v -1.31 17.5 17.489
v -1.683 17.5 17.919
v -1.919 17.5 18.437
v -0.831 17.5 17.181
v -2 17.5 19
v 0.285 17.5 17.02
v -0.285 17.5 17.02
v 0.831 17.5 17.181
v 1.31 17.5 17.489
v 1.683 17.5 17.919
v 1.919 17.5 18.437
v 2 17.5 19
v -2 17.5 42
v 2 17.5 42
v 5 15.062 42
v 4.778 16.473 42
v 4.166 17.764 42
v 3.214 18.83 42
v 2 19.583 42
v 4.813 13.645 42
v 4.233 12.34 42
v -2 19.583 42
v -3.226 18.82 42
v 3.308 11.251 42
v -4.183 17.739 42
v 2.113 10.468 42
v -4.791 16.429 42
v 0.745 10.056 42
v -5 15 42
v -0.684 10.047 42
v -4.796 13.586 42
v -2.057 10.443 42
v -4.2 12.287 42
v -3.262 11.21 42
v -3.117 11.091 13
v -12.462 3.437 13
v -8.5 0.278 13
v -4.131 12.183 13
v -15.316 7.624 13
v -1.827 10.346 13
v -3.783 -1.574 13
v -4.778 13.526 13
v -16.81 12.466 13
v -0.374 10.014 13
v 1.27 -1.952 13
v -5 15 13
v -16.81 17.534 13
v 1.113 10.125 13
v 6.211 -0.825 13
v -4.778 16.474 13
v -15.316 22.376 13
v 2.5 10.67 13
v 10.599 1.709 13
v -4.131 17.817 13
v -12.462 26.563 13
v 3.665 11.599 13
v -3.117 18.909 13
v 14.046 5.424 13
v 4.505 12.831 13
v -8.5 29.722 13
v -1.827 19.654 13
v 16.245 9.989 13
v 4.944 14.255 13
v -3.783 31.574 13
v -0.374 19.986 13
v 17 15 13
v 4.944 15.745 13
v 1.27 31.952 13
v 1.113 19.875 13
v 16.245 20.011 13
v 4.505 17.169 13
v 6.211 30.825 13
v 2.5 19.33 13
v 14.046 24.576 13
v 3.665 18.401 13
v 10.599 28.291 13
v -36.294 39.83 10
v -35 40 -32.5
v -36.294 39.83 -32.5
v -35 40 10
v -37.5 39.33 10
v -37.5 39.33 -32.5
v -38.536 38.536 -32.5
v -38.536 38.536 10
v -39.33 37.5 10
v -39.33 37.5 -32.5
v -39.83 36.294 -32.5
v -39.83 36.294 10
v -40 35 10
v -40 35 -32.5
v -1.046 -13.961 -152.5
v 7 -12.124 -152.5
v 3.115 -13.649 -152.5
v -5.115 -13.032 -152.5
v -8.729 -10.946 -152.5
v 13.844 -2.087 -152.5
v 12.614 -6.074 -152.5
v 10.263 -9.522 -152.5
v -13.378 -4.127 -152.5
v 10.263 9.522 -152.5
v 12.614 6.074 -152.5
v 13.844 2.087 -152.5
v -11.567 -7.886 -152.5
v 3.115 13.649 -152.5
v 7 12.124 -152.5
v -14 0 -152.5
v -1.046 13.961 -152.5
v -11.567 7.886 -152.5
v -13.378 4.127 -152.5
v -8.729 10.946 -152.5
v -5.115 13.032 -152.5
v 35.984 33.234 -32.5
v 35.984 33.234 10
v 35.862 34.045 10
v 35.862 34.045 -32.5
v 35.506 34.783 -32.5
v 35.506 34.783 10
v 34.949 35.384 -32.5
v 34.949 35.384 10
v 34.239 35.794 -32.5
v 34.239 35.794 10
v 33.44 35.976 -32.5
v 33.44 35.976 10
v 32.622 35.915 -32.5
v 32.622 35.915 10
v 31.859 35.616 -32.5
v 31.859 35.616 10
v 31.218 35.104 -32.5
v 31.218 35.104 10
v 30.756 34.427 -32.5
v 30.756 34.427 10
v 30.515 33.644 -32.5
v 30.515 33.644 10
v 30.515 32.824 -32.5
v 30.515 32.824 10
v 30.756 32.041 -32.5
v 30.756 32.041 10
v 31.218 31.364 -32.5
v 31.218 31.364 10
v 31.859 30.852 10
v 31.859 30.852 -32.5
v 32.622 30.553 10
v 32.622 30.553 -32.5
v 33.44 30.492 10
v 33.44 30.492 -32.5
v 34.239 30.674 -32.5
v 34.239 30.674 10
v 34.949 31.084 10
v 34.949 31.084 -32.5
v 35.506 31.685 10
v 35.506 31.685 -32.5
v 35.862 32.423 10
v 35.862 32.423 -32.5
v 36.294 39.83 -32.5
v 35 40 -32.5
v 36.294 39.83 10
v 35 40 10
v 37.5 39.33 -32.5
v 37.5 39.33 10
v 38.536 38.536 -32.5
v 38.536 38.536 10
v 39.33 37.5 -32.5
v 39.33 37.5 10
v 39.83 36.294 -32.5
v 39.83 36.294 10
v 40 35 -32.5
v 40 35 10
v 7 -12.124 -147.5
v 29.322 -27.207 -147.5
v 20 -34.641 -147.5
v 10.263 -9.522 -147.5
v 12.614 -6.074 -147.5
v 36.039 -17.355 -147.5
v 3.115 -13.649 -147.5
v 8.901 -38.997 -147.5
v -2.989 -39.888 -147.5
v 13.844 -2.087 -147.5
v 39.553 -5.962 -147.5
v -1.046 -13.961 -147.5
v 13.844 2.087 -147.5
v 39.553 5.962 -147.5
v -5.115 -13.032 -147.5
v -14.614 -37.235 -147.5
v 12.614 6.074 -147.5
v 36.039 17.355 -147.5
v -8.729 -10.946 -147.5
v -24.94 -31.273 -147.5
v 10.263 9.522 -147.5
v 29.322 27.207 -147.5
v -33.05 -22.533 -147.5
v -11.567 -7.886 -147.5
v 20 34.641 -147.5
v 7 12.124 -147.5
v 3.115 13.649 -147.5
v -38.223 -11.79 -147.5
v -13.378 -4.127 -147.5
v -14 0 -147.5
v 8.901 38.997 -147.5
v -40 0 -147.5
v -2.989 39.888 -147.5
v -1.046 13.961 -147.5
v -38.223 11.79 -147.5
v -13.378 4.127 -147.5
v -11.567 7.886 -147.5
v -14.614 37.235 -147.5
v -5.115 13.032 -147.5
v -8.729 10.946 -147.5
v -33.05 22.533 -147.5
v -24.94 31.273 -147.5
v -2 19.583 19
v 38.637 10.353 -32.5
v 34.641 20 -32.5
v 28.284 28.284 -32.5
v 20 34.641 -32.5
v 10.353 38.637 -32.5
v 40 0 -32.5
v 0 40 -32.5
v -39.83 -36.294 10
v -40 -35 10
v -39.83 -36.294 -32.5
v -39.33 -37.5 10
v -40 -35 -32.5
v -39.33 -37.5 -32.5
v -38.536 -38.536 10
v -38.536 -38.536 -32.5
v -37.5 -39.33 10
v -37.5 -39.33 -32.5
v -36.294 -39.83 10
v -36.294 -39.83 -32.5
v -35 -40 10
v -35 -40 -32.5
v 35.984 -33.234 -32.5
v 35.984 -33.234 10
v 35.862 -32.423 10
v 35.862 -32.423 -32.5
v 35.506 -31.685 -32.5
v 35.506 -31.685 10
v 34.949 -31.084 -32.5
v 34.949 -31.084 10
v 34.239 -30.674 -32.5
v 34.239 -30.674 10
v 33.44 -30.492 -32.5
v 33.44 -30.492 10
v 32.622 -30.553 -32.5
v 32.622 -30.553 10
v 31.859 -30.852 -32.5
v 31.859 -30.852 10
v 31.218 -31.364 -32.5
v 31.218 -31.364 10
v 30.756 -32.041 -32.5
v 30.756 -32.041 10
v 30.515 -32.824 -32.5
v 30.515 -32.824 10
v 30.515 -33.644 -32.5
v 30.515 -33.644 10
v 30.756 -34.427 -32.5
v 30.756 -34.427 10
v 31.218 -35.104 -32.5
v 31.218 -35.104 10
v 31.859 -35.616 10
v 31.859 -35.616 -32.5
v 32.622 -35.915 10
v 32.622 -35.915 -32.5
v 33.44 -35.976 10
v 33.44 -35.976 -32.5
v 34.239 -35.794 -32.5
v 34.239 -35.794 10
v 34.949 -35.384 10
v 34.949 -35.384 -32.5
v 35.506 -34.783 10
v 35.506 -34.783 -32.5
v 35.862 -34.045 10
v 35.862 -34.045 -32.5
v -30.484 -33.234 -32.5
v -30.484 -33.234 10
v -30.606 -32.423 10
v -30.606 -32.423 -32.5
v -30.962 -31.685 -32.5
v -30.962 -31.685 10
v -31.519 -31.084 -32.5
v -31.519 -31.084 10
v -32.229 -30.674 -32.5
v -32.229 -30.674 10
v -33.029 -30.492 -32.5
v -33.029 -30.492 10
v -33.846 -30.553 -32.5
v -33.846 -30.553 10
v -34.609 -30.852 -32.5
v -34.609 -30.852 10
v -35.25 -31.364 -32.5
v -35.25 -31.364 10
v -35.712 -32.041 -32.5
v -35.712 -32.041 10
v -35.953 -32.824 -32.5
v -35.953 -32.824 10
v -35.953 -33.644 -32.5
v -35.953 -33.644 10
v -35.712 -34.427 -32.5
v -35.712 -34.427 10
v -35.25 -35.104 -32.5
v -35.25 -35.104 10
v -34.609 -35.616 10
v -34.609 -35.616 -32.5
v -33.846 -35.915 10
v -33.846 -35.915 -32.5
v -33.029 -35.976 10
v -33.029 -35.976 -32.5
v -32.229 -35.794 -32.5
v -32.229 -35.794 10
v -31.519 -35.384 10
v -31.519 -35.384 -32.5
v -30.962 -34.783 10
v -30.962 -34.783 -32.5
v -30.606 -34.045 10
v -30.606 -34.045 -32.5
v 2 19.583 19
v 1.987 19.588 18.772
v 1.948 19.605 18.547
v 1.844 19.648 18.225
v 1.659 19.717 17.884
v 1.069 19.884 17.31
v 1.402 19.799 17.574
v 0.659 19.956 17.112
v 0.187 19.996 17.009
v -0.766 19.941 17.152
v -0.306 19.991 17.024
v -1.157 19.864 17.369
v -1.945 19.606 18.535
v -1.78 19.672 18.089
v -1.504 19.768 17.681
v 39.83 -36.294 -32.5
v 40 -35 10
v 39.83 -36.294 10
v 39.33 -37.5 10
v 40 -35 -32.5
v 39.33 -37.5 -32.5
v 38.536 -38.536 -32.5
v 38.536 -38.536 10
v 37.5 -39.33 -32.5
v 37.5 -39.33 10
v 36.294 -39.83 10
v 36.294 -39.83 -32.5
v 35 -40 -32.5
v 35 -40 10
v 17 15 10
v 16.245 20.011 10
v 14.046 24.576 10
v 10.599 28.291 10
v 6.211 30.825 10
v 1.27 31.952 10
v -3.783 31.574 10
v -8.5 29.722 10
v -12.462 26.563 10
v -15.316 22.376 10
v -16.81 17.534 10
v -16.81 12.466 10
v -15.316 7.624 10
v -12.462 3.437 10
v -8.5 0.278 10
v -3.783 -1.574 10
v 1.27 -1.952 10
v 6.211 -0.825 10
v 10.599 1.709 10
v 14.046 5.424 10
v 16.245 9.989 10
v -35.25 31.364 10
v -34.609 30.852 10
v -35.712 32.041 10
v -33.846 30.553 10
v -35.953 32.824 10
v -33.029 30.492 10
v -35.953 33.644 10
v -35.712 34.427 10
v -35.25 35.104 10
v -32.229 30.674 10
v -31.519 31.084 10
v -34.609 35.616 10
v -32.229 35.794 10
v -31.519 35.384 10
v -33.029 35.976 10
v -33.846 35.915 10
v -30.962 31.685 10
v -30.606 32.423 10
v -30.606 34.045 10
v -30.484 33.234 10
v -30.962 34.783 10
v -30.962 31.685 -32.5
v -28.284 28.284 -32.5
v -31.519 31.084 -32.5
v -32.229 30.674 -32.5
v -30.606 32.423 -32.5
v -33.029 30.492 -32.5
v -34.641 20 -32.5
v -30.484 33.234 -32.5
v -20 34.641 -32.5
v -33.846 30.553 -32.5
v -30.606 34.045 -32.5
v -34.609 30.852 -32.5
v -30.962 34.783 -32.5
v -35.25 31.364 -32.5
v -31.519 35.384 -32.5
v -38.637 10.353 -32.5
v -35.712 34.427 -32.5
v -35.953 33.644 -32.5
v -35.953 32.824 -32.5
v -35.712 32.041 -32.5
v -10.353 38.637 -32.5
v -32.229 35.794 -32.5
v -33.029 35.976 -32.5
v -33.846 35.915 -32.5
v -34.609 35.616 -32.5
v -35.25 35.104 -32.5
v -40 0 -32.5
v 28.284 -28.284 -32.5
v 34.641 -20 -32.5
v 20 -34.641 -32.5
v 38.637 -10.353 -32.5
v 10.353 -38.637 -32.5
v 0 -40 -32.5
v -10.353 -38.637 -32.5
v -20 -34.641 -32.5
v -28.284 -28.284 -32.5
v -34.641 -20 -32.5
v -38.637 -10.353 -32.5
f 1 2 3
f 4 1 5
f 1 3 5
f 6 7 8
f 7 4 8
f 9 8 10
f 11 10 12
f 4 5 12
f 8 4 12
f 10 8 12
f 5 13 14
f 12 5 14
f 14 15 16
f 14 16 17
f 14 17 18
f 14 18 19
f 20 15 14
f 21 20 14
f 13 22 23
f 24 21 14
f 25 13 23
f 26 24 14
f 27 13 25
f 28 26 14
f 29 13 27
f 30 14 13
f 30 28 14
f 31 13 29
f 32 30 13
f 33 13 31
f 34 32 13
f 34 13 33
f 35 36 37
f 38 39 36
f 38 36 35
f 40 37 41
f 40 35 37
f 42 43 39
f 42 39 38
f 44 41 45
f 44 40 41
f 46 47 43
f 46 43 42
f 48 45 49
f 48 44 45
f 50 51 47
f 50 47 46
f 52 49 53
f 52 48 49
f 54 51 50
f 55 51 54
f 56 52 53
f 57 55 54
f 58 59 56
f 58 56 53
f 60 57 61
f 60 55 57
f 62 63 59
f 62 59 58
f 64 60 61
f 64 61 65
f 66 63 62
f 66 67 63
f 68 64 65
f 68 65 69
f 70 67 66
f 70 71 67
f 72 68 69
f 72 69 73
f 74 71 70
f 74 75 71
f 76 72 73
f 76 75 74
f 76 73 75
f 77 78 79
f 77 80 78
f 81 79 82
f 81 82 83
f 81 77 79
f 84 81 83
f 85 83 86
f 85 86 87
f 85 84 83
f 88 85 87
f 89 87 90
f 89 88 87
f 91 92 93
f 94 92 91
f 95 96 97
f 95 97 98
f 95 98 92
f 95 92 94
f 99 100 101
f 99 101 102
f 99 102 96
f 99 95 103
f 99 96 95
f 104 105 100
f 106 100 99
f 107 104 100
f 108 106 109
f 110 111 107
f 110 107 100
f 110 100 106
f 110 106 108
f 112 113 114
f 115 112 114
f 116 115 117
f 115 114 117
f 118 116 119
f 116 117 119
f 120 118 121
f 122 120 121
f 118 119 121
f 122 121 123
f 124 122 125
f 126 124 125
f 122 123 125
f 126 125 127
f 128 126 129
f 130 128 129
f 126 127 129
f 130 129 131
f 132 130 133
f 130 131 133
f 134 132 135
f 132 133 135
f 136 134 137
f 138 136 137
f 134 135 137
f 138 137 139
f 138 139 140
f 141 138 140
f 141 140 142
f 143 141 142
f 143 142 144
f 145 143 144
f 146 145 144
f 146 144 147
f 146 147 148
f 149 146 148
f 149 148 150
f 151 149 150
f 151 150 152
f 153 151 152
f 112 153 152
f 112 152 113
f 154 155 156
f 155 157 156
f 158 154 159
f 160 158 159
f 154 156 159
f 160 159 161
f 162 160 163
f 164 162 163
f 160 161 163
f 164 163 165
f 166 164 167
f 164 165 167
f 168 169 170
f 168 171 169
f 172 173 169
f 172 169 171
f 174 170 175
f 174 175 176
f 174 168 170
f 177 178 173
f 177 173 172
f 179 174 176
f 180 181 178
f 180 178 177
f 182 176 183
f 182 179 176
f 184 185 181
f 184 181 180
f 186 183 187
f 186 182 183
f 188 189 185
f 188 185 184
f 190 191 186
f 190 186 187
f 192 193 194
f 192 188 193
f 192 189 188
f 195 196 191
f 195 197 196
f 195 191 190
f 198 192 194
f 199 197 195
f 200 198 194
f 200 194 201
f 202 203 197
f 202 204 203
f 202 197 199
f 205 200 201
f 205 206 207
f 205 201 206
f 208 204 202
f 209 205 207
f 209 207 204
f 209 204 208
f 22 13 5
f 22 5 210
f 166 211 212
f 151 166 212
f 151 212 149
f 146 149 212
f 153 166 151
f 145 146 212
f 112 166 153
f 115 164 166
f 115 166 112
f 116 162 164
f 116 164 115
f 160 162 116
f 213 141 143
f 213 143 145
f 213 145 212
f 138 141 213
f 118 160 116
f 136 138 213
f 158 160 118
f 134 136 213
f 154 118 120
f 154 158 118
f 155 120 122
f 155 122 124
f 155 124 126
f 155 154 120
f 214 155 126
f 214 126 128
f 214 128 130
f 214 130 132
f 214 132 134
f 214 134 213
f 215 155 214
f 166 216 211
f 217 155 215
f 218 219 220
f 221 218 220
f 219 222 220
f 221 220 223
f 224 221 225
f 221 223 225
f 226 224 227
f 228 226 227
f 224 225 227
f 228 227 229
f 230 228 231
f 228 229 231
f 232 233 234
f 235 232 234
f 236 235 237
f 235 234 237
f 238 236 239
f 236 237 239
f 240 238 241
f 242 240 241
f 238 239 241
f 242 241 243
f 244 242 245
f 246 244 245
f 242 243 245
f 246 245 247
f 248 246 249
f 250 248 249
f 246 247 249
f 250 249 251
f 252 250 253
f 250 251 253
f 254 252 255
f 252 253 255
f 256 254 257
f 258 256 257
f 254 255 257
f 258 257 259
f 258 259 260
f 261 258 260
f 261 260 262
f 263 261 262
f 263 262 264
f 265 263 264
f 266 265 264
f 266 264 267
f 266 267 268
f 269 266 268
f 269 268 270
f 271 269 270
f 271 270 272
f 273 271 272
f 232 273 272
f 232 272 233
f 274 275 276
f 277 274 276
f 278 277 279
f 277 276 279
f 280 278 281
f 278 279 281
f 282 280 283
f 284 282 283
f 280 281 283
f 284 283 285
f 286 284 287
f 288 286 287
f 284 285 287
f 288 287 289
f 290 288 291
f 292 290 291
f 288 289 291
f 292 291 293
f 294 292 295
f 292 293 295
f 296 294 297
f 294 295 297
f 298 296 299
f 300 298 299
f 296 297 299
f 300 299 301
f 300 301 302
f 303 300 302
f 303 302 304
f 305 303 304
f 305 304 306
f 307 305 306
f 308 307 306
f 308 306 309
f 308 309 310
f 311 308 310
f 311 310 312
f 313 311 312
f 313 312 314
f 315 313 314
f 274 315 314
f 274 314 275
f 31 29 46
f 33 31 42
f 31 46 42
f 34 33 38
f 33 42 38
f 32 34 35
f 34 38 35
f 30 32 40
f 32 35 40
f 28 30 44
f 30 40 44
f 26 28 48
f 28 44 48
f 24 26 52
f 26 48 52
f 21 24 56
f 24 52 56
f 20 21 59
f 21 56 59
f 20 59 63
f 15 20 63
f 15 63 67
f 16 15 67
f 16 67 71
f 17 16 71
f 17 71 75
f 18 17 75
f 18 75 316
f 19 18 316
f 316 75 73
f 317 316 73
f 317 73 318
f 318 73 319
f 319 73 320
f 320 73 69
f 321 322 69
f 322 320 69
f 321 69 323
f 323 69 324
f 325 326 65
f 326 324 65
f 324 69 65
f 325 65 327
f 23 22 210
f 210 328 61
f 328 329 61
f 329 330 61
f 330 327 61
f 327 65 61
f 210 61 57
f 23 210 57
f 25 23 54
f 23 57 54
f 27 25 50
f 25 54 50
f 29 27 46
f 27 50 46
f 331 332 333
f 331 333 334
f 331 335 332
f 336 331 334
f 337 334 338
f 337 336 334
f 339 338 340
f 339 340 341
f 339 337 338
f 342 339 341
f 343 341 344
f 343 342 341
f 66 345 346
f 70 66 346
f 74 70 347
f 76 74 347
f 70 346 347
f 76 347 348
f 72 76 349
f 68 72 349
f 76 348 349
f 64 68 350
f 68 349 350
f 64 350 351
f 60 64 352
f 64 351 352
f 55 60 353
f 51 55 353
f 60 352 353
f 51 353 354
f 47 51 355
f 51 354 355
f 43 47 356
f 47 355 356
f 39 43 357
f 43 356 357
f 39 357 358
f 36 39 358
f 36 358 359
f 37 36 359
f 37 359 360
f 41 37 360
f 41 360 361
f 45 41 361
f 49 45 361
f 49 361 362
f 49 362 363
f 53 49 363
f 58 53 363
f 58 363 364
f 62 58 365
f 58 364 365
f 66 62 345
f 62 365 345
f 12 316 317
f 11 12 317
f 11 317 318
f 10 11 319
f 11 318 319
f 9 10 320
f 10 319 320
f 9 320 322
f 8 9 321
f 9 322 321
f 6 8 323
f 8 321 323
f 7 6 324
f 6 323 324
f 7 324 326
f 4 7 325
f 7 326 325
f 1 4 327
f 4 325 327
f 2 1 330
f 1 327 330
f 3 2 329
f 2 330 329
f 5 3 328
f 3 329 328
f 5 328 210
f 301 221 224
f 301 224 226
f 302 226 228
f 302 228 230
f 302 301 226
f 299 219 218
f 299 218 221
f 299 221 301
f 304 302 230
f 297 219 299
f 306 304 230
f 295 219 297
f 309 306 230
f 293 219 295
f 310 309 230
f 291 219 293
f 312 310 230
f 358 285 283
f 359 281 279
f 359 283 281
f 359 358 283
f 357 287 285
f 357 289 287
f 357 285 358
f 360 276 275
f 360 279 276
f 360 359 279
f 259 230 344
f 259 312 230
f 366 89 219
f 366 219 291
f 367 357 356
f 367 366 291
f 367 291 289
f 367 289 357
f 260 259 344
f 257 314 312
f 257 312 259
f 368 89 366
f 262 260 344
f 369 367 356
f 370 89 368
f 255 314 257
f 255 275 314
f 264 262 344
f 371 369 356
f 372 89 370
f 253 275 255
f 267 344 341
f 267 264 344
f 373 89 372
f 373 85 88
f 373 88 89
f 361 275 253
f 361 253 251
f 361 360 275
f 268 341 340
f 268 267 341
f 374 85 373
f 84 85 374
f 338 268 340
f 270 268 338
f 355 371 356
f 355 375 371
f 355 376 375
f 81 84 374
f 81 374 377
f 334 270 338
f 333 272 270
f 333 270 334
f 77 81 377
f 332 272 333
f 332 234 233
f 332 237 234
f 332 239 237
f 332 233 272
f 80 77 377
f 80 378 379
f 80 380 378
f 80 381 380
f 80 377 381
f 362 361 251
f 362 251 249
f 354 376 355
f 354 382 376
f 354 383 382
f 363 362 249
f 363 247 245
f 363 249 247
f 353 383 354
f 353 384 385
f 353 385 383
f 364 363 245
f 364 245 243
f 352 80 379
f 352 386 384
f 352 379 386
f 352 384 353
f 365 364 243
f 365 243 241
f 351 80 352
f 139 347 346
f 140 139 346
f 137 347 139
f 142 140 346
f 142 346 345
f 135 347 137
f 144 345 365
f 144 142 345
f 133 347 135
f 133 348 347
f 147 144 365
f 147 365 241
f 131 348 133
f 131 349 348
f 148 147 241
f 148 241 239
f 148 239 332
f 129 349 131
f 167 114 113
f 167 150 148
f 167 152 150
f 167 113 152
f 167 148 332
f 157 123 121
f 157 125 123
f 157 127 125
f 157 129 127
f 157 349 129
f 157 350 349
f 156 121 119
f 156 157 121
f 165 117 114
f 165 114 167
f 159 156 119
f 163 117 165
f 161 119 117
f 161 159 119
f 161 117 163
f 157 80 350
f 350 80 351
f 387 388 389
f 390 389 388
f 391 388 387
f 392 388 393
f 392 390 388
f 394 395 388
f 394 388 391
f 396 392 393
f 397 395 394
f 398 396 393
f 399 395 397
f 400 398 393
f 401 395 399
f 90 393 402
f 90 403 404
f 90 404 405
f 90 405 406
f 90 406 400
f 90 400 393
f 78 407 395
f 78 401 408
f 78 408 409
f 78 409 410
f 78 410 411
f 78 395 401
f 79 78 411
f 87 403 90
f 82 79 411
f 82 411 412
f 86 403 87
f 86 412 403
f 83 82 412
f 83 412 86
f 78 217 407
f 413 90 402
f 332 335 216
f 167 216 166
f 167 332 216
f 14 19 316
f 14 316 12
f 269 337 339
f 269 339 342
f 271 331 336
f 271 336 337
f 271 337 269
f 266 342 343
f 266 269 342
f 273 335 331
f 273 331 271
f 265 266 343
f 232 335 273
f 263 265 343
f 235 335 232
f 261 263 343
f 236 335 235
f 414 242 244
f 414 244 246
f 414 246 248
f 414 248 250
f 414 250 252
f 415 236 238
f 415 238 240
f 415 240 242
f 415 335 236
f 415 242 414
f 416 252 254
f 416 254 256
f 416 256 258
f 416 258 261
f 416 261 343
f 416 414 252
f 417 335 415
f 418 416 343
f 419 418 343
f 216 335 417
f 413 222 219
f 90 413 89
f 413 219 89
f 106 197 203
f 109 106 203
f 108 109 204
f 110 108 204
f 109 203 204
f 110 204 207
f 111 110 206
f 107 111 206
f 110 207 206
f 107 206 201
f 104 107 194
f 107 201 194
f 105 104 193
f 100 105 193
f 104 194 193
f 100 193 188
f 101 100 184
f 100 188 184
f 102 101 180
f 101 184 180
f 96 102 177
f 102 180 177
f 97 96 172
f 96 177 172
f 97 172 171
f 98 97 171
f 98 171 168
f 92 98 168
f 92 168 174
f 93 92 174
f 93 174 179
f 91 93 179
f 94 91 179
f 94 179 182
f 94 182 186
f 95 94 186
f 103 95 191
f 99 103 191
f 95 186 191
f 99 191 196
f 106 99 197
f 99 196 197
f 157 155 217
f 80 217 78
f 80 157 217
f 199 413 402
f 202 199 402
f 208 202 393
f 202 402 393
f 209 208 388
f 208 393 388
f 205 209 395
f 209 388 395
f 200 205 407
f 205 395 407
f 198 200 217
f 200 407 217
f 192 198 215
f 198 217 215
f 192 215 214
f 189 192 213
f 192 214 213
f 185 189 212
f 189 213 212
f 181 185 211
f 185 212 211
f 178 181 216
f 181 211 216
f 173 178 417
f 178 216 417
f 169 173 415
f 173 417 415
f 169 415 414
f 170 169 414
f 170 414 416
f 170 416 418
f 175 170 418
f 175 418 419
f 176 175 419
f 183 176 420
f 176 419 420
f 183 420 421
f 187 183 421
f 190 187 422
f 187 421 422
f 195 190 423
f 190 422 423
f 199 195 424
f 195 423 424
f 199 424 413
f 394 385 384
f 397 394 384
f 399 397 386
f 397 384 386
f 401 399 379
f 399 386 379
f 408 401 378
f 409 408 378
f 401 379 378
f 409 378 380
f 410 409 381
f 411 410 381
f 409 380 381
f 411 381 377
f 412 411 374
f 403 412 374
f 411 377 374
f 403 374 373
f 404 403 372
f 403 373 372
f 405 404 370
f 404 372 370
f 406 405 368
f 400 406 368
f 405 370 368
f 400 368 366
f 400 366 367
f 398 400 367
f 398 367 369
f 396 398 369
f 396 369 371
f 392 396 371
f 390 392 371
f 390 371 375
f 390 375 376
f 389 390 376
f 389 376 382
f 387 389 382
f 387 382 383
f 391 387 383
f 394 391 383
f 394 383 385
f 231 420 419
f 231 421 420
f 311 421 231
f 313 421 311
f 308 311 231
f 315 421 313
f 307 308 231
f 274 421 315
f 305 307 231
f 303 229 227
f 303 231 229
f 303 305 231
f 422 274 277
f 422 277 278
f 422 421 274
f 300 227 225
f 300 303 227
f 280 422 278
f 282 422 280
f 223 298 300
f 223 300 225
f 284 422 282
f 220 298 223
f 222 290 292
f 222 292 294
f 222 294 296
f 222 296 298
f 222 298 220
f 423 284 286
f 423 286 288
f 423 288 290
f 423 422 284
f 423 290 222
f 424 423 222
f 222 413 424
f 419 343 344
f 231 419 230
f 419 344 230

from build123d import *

# Parameters (mm, degrees)
SKETCH_1_W          = 80
SKETCH_1_H          = 80
EXTRUDE_1_DEPTH     = 10
SKETCH_2_R          = 17
EXTRUDE_2_DEPTH     = 3
SKETCH_3_R          = 5
EXTRUDE_3_DEPTH     = 29
CUT_EXTRUDE_1_DEPTH = 23
CUT_EXTRUDE_4_DEPTH = 2.5
SKETCH_7_W          = 80
SKETCH_7_H          = 80
EXTRUDE_6_DEPTH     = 32.5
SKETCH_10_R         = 40
EXTRUDE_7_DEPTH     = 115
SKETCH_11_R         = 14
EXTRUDE_8_DEPTH     = 5
SKETCH_12_R         = 2.75
CUT_EXTRUDE_5_DEPTH = 173.064668076
FILLET_1_R          = 5


with BuildPart() as part:
    # 스케치1 → 보스-돌출1 (new body)
    with BuildSketch(Plane.XY):
        Rectangle(SKETCH_1_W, SKETCH_1_H)
    extrude(amount=EXTRUDE_1_DEPTH)

    # 스케치2 → 보스-돌출2 (add)
    with BuildSketch(Plane.XY.offset(10)):
        with Locations((0, 15)):
            Circle(SKETCH_2_R)
    extrude(amount=EXTRUDE_2_DEPTH)

    # 스케치3 → 보스-돌출3 (add)
    with BuildSketch(Plane.XY.offset(13)):
        with Locations(Location((0, 15, 0), (0, 0, 180))):
            Circle(SKETCH_3_R)
    extrude(amount=EXTRUDE_3_DEPTH)

    # 스케치4 → 컷-돌출1 (cut)
    with BuildSketch(Plane.XY.offset(42)):
        Polygon((0, 17.5), (-2, 17.5), (-2, 20.912683476), (2, 20.912683476), (2, 17.5), align=None)
    extrude(amount=-CUT_EXTRUDE_1_DEPTH, mode=Mode.SUBTRACT)

    # 스케치6 → 컷-돌출4 (cut)
    with BuildSketch(Plane(origin=(0, 20, 0), x_dir=(1, 0, 0), z_dir=(0, 1, 0))):
        with BuildLine():
            Line((-2, -19), (-2, -52.407669752))
            Line((-2, -52.407669752), (2, -52.407669752))
            Line((2, -52.407669752), (2, -19))
            ThreePointArc((2, -19), (0, -17), (-2, -19))
        make_face()
    extrude(amount=-CUT_EXTRUDE_4_DEPTH, mode=Mode.SUBTRACT)

    # 스케치7 → 보스-돌출6 (add)
    with BuildSketch(Plane(origin=(0, 0, 0), x_dir=(-1, 0, 0), z_dir=(0, 0, -1))):
        Rectangle(SKETCH_7_W, SKETCH_7_H)
    extrude(amount=EXTRUDE_6_DEPTH)

    # 스케치10 → 보스-돌출7 (add)
    with BuildSketch(Plane(origin=(0, 0, -32.5), x_dir=(-1, 0, 0), z_dir=(0, 0, -1))):
        Circle(SKETCH_10_R)
    extrude(amount=EXTRUDE_7_DEPTH)

    # 스케치11 → 보스-돌출8 (add)
    with BuildSketch(Plane(origin=(0, 0, -147.5), x_dir=(-1, 0, 0), z_dir=(0, 0, -1))):
        Circle(SKETCH_11_R)
    extrude(amount=EXTRUDE_8_DEPTH)

    # 스케치12 → 컷-돌출5 (cut, through all)
    with BuildSketch(Plane.XY.offset(10)):
        with Locations((33.234018716, 33.234018716)):
            Circle(SKETCH_12_R)
        with Locations((-33.234018716, 33.234018716)):
            Circle(SKETCH_12_R)
        with Locations((-33.234018716, -33.234018716)):
            Circle(SKETCH_12_R)
        with Locations((33.234018716, -33.234018716)):
            Circle(SKETCH_12_R)
    extrude(amount=-CUT_EXTRUDE_5_DEPTH, mode=Mode.SUBTRACT)

    # 필렛1
    fillet_1_edges = [part.edges().sort_by_distance(p)[0] for p in [
        (40, -40, -11.25),
        (-40, -40, -11.25),
        (-40, 40, -11.25),
        (40, 40, -11.25),
    ]]
    fillet(fillet_1_edges, radius=FILLET_1_R)


solid = part.part
